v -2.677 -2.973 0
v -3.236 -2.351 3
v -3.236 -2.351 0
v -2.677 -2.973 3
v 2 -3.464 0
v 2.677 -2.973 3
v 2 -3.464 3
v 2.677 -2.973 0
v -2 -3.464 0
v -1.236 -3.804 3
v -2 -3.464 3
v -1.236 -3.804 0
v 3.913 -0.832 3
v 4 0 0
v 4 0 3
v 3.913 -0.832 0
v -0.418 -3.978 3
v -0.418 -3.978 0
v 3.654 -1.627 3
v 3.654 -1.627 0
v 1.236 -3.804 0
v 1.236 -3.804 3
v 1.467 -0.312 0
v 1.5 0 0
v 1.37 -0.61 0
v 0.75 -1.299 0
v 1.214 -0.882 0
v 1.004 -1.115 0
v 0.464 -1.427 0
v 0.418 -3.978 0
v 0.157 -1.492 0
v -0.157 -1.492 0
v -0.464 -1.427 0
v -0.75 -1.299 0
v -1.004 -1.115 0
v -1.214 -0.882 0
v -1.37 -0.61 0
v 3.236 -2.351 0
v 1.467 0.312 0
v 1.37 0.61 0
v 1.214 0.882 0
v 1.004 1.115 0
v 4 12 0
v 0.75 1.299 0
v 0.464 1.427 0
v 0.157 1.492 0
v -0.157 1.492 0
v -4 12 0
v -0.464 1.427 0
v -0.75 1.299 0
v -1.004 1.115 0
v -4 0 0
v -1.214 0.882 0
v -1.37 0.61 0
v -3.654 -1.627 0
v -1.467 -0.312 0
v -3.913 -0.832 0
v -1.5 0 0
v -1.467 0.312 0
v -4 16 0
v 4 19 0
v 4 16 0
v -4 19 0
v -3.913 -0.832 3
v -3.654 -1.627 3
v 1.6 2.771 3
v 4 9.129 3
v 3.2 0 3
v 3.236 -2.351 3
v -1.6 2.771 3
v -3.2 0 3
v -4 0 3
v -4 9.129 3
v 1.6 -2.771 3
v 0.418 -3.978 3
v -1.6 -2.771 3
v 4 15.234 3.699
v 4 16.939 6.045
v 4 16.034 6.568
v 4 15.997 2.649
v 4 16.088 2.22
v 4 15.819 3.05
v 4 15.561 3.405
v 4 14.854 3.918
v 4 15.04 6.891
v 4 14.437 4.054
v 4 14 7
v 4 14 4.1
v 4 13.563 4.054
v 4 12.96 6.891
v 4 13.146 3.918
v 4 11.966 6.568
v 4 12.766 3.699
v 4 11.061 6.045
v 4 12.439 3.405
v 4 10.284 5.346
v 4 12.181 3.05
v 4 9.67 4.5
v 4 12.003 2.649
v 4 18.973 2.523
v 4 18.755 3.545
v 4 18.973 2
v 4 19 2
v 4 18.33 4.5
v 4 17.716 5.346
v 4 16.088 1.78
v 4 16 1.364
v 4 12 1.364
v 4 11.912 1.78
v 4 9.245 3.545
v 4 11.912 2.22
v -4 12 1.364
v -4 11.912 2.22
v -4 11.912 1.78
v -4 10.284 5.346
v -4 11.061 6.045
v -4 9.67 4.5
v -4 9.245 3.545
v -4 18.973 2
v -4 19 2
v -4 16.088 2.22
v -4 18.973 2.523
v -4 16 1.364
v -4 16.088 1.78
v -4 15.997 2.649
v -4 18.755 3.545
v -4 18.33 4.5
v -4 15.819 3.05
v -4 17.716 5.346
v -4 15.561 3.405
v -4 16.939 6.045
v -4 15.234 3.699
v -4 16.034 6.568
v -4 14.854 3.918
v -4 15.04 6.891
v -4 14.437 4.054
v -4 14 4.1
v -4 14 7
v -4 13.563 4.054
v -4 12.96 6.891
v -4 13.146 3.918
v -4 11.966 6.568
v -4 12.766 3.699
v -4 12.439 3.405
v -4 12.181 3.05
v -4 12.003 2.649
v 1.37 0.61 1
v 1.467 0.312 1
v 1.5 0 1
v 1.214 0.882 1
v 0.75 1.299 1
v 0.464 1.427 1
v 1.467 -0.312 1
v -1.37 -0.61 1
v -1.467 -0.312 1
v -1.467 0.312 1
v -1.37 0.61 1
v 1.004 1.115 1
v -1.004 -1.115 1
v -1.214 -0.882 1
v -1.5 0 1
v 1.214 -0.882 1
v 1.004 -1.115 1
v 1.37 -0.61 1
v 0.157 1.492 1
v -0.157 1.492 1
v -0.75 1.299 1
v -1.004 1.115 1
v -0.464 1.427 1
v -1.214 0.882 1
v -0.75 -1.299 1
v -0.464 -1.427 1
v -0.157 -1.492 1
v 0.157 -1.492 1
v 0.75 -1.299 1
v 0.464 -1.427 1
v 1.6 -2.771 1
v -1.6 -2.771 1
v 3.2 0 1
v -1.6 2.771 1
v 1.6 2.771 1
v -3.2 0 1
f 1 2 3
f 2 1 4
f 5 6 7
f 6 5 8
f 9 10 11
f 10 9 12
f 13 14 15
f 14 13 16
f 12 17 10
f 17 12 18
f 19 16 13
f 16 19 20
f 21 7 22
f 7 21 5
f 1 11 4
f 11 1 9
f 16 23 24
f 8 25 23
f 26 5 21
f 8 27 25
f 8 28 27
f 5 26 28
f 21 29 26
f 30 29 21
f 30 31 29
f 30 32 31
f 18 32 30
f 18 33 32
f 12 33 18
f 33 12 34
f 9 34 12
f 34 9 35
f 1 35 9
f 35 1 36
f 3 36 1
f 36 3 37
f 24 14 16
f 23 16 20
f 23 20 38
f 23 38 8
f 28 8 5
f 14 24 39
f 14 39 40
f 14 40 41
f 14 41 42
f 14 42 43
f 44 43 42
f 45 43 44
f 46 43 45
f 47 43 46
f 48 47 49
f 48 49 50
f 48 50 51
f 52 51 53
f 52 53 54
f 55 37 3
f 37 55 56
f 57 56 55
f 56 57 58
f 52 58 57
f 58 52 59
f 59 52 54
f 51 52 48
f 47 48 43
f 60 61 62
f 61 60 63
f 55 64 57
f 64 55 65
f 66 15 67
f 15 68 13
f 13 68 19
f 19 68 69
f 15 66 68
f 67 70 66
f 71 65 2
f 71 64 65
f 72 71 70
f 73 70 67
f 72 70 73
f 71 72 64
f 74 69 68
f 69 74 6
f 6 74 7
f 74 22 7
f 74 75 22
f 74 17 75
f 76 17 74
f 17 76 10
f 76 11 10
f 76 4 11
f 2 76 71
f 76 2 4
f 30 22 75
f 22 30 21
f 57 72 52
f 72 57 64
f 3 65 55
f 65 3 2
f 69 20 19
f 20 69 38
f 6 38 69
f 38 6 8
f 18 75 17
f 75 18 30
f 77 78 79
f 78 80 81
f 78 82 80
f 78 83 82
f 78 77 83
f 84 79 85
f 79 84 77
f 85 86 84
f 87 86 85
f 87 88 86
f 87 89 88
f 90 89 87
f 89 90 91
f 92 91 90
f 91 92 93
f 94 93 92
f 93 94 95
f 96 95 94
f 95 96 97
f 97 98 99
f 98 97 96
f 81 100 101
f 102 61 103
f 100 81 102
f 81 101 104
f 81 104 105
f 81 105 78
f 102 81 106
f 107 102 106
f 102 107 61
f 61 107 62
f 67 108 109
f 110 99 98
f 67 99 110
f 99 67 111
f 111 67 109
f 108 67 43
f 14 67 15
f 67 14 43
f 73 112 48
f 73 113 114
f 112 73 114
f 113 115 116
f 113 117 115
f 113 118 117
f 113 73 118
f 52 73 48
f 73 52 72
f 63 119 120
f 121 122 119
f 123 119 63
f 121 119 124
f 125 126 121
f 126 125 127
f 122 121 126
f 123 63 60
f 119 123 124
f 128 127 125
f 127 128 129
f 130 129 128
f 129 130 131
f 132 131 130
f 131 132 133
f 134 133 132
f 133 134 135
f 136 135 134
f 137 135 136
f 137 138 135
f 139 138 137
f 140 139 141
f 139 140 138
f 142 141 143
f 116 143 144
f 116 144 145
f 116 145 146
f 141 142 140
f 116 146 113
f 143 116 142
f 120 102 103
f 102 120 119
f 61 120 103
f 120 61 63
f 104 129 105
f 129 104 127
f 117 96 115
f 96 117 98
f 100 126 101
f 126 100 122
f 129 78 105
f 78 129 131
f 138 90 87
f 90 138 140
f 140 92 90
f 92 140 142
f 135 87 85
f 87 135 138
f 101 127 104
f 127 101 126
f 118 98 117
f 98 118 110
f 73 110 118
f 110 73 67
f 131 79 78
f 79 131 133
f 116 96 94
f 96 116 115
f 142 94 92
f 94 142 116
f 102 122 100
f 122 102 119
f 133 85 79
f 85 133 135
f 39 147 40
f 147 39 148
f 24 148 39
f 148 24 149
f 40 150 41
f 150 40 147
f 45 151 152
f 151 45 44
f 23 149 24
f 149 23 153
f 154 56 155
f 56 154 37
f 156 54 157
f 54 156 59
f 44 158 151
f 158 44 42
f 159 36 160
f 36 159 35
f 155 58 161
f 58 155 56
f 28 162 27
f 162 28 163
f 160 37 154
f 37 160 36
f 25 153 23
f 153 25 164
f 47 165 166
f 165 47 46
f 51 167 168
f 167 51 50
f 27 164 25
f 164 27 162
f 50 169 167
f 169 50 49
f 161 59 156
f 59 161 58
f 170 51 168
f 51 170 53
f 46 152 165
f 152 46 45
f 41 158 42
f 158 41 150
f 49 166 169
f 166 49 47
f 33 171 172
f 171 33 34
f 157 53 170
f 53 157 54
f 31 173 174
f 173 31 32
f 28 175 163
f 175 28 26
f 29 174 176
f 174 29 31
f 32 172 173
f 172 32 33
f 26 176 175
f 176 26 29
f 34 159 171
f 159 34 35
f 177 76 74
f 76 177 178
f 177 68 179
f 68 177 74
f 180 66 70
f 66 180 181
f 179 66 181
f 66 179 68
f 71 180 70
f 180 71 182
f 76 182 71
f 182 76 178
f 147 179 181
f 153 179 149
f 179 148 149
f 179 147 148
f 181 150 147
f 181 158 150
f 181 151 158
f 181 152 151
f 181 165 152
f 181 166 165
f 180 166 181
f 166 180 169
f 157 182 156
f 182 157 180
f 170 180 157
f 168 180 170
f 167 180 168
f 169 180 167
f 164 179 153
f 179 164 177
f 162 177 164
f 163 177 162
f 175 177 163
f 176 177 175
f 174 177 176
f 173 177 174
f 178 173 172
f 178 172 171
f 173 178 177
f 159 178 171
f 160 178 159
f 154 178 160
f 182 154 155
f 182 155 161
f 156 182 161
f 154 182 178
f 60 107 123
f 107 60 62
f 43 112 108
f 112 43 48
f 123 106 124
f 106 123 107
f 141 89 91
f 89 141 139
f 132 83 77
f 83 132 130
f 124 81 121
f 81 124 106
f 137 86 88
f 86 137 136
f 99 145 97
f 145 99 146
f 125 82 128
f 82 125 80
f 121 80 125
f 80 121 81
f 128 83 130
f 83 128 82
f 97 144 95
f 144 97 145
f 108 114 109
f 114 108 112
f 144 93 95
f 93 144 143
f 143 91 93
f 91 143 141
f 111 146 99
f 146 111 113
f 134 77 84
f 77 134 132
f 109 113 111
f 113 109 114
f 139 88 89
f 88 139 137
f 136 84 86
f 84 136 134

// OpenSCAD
// file: config.scad
/**
 * Глобальный конфигурационный файл
 */
// качество цилиндров
$fn=30;

// избегание совпадения граней
DELTA=0.1;

// толщина рамы
FRAME=18;

// расстояние от стенок до гайки
DELTA_NUT = 0.3;
// высота, макс. диаметр, между стенками (размер ключа)
// гайка М3
m3_base=[2.4,6.4,5.5];
m3_hole=m3_base+[DELTA_NUT,DELTA_NUT,DELTA_NUT];
//[3,7,6]
// гайка М4
m4_base=[3.2,8.1,6.9];
m4_hole=m4_base+[DELTA_NUT,DELTA_NUT,DELTA_NUT];
// гайка М5
m5_base=[3.8,9.1,7.9];
m5_hole=m5_base+[DELTA_NUT,DELTA_NUT,DELTA_NUT];
// main file
include <config.scad>

y1=14;
z1=2;

difference() {
    union() {
        cylinder(r=4,h=3);
        translate([-4,0,0])cube([8,y1,3]);
        translate([-4,5,0])cube([8,y1,z1]);
        translate([-4,y1,z1])rotate([0,90,0])cylinder(r=5,h=8);
    }
    translate([0,0,-DELTA])cylinder(r=1.5,h=3);
    translate([0,0,1])cylinder(r=m3_base[1]/2,h=m3_base[0],$fn=6);
    translate([-4-DELTA,y1-2,-DELTA])cube([8+DELTA*2,4,z1]);
    translate([-4-DELTA,y1,z1])rotate([0,90,0])cylinder(r=2+DELTA,h=8+DELTA*2);
    translate([-5,-5,-10])cube([10,y1+11,10]);
}
